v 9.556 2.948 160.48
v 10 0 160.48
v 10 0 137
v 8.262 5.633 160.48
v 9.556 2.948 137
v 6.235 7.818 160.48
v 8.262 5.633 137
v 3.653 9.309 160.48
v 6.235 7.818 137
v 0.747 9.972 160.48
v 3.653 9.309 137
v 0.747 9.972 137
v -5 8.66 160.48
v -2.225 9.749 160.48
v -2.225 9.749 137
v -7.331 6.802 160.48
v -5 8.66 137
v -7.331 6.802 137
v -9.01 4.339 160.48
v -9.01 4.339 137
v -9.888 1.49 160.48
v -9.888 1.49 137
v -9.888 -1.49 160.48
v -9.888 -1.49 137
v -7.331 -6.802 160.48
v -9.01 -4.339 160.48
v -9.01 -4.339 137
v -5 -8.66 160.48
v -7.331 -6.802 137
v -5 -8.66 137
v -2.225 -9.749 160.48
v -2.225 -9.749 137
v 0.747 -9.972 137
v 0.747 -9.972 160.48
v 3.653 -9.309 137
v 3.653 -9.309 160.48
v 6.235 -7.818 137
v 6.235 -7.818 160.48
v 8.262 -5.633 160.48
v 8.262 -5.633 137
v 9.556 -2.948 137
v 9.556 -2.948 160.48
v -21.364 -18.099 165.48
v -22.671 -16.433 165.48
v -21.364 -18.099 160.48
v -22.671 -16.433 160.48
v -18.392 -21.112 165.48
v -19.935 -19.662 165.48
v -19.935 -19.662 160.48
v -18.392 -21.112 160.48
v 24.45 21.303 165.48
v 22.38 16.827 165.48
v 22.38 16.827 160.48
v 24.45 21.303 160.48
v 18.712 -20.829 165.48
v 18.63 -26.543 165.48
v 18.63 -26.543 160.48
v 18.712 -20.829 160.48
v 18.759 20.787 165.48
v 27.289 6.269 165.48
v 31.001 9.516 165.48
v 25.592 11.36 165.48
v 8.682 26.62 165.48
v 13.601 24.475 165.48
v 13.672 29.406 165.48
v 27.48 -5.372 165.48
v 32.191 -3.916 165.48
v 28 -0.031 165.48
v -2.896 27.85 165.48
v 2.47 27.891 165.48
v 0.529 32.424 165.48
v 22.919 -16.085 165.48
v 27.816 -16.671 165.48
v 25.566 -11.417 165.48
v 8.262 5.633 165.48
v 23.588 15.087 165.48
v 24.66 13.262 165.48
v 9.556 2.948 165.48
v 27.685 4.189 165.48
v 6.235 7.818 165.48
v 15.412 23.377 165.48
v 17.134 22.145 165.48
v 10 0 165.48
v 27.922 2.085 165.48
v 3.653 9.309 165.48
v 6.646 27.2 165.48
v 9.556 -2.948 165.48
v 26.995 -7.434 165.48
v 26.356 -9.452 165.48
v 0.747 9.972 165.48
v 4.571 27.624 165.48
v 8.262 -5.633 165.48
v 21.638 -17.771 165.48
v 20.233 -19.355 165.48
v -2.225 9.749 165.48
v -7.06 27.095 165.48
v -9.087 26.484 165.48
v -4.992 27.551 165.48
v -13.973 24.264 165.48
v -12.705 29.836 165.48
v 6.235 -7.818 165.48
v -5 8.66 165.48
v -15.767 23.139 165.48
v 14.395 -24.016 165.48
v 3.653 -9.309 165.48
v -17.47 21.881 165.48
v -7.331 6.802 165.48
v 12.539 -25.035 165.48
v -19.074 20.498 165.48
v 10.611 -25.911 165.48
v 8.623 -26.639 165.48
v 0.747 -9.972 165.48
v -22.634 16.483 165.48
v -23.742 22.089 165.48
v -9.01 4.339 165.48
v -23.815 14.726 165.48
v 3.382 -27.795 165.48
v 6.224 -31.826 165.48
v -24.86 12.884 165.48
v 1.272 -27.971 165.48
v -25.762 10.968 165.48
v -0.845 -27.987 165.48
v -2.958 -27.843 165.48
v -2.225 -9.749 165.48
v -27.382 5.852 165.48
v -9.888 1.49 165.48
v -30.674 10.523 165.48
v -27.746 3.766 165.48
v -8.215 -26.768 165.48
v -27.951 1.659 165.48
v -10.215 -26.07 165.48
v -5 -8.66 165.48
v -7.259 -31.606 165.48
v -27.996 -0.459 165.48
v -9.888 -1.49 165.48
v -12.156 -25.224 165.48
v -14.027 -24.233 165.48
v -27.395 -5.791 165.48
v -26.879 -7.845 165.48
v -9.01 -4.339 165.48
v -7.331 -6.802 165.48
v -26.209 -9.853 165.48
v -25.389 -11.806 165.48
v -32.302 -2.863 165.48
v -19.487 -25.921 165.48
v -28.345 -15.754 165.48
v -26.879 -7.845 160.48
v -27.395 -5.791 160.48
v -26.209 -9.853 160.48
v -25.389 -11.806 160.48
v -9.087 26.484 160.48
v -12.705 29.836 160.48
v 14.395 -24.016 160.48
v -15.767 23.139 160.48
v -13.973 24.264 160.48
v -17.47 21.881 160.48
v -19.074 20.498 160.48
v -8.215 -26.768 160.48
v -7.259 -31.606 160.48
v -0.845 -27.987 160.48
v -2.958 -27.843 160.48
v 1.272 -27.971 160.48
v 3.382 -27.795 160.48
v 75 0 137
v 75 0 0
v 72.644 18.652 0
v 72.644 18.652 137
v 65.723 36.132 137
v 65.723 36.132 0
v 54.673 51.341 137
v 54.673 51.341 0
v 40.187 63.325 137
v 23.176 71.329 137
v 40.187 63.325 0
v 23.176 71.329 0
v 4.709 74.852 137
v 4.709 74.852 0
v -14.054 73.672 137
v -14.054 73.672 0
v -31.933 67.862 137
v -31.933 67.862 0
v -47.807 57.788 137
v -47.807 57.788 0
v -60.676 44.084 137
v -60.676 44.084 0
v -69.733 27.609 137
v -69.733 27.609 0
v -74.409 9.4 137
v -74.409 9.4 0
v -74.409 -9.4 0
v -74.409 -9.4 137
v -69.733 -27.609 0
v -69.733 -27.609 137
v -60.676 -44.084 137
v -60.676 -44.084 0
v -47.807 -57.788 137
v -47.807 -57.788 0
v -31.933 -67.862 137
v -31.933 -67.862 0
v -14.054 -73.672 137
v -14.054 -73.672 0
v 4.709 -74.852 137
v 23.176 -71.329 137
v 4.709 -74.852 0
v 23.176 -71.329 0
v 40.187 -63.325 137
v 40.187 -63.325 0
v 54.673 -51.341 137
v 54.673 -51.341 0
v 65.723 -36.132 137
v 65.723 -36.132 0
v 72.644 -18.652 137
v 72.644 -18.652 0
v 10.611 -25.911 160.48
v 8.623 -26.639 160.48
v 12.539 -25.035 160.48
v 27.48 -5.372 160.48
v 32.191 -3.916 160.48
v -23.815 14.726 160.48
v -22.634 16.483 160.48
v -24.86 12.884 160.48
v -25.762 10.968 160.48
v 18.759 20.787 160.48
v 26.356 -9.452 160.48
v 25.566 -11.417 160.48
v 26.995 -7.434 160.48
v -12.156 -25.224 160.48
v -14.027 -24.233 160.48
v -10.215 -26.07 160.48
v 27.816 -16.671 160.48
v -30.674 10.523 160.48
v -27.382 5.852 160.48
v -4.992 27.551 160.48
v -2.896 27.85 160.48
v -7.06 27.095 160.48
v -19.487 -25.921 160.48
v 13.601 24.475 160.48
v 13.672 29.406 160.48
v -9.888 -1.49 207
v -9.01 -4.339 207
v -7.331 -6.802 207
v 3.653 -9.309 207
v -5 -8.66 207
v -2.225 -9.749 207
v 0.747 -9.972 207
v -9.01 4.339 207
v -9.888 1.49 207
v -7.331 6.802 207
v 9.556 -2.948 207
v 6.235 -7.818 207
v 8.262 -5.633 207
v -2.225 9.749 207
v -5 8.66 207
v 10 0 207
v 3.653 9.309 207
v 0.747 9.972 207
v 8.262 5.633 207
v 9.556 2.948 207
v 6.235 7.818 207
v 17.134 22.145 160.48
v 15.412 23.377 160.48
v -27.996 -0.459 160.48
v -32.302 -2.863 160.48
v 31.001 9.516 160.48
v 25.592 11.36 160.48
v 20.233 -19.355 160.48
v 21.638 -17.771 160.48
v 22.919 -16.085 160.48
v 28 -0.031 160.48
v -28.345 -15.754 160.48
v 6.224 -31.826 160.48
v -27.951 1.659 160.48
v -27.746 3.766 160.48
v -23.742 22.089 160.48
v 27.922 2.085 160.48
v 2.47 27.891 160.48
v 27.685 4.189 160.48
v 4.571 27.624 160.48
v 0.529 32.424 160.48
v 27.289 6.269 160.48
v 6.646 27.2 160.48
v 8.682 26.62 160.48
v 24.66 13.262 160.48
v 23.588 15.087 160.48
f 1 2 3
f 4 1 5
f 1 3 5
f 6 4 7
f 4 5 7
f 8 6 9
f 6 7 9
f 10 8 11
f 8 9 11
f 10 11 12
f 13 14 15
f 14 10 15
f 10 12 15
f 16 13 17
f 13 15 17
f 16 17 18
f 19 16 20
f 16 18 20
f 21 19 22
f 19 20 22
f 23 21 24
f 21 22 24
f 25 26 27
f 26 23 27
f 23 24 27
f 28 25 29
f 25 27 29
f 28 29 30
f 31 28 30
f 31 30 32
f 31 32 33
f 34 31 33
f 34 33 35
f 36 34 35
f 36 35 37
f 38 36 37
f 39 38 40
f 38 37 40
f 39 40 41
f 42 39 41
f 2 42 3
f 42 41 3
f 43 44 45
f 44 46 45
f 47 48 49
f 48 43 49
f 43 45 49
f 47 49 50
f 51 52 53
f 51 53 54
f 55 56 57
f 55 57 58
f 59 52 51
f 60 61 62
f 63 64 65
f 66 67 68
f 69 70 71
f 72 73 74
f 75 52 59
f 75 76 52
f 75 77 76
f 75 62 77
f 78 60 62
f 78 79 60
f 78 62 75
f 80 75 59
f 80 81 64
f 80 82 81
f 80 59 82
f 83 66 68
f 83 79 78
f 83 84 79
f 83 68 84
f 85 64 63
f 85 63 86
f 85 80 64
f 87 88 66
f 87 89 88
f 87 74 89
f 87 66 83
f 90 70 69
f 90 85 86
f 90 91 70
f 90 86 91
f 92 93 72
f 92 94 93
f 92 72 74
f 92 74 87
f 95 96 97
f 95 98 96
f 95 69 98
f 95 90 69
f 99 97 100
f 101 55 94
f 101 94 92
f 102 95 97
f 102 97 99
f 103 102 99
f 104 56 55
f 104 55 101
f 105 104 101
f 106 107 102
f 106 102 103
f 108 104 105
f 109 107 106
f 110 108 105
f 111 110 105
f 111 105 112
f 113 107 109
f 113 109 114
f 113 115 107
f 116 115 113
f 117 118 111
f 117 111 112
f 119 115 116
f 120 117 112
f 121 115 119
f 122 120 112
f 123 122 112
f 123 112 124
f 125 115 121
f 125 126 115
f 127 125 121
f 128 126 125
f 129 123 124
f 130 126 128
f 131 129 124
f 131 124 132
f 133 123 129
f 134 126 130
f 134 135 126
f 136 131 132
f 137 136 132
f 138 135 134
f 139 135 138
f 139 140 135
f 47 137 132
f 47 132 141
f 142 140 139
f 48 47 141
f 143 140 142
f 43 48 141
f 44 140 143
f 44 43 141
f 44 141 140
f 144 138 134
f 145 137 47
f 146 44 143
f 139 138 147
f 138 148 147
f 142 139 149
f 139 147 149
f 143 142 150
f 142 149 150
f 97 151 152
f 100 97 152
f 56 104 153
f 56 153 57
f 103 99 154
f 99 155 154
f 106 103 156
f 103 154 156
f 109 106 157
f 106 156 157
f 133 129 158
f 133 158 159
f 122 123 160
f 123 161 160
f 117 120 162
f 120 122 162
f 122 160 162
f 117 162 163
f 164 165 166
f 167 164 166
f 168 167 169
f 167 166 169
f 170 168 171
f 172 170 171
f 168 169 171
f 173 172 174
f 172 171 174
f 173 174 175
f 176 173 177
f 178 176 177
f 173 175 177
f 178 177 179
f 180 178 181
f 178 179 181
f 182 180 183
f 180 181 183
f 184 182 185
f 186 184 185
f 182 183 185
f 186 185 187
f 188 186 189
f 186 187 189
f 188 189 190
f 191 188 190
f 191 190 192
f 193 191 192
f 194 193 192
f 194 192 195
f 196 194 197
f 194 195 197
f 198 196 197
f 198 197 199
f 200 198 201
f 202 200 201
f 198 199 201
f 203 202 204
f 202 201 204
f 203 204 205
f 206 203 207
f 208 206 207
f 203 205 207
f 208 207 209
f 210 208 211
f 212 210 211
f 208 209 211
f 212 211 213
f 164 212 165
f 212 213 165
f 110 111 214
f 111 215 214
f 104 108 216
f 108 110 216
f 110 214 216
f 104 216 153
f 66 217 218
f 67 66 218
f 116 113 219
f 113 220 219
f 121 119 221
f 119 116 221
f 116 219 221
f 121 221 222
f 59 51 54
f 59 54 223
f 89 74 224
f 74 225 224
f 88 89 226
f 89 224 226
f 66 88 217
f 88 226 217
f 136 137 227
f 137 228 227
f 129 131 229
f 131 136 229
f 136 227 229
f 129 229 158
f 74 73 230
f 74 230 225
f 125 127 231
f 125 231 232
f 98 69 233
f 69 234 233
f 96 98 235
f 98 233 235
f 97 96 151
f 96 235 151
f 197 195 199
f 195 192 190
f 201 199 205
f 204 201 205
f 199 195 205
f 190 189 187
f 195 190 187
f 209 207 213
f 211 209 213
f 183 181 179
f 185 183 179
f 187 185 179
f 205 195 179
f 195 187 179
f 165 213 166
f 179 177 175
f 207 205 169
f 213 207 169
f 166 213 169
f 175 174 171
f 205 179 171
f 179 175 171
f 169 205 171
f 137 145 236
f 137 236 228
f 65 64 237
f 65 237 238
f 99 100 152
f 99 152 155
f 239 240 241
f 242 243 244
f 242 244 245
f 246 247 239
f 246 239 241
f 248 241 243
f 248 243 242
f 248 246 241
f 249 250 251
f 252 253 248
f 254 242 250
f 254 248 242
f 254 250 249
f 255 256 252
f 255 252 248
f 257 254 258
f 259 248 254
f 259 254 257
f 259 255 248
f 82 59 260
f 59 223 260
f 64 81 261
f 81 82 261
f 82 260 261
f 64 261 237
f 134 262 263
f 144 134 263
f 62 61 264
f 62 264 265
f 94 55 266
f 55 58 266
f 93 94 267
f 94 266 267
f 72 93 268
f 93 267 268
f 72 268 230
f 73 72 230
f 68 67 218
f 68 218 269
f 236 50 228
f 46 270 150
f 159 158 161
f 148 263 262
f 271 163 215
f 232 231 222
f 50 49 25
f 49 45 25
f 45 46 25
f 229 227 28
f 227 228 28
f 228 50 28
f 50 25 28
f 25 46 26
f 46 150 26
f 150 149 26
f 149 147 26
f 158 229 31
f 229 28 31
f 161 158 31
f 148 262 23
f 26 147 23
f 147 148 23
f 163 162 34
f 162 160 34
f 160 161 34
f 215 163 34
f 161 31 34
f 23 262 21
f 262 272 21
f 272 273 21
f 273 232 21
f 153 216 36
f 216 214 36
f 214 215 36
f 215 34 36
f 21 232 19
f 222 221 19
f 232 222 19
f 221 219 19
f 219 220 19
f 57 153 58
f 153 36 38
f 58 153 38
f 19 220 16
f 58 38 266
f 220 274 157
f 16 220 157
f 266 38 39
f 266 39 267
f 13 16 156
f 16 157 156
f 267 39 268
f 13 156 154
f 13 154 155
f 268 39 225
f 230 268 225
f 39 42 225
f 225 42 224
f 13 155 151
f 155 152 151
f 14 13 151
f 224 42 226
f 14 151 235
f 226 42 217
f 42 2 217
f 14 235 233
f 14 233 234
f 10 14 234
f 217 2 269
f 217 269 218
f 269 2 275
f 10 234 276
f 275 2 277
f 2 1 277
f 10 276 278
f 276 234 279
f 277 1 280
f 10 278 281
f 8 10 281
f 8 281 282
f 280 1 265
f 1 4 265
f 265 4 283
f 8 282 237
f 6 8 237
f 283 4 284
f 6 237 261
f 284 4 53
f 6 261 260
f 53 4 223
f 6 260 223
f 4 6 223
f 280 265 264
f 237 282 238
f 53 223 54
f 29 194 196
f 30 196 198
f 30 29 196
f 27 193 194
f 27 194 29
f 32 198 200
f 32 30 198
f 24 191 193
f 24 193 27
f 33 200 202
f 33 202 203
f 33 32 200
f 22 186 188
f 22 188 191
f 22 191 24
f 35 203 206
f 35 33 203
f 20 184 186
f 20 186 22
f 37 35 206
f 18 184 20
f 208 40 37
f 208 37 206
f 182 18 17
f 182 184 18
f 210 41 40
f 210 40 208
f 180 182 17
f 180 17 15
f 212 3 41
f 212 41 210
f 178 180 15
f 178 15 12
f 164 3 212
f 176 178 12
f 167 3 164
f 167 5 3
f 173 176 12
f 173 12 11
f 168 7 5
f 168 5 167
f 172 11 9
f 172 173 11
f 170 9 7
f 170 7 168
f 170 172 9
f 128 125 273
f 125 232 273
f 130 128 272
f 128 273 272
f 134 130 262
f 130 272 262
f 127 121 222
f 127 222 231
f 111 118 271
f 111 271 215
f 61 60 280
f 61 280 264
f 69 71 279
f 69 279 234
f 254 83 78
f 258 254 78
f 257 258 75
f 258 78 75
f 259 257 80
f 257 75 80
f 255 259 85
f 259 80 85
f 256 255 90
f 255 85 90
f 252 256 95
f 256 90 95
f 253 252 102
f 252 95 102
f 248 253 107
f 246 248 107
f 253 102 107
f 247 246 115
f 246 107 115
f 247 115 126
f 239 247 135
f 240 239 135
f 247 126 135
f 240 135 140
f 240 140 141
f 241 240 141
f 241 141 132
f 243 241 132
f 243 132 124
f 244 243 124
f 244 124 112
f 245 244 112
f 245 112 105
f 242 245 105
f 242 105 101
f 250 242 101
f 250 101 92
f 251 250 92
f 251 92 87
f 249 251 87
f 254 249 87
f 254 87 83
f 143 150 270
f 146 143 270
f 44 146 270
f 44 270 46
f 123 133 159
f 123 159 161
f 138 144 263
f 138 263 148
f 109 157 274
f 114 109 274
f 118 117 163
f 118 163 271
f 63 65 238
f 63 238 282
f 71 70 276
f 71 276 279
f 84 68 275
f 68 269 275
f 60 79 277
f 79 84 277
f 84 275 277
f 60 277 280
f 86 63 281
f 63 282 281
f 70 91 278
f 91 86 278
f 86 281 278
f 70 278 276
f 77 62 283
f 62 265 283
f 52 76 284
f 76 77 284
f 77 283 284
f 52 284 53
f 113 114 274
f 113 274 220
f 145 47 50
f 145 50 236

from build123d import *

# Parameters (mm, degrees)
SKETCH1_R           = 75
BOSS_EXTRUDE1_DEPTH = 137
SKETCH2_R           = 10
BOSS_EXTRUDE2_DEPTH = 70
SKETCH4_R           = 28
BOSS_EXTRUDE3_DEPTH = 5
BOSS_EXTRUDE4_DEPTH = 5
CIRPATTERN1_COUNT   = 15


with BuildPart() as part:
    # Sketch1 → Boss-Extrude1 (new body)
    with BuildSketch(Plane.XY):
        Circle(SKETCH1_R)
    extrude(amount=BOSS_EXTRUDE1_DEPTH)

    # Sketch2 → Boss-Extrude2 (add)
    with BuildSketch(Plane.XY.offset(137)):
        Circle(SKETCH2_R)
    extrude(amount=BOSS_EXTRUDE2_DEPTH)

    # Sketch4 → Boss-Extrude3 (add)
    with BuildSketch(Plane.XY.offset(160.48)):
        Circle(SKETCH4_R)
    extrude(amount=BOSS_EXTRUDE3_DEPTH)

    # Sketch5 → Boss-Extrude4 (add)
    with BuildSketch(Plane.XY.offset(165.48)):
        Polygon((3.567039891, 25.329459933), (0.529235594, 32.424417196), (-4.096275486, 26.246122872), align=None)
    boss_extrude4 = extrude(amount=-BOSS_EXTRUDE4_DEPTH)

    # CirPattern1: Boss-Extrude4 ×15 about axis
    cirpattern1_axis = Axis((0, 0, 0), (0, 0, 1))
    for i in range(1, CIRPATTERN1_COUNT):
        add(boss_extrude4.rotate(cirpattern1_axis, i * 360 / CIRPATTERN1_COUNT))


solid = part.part
